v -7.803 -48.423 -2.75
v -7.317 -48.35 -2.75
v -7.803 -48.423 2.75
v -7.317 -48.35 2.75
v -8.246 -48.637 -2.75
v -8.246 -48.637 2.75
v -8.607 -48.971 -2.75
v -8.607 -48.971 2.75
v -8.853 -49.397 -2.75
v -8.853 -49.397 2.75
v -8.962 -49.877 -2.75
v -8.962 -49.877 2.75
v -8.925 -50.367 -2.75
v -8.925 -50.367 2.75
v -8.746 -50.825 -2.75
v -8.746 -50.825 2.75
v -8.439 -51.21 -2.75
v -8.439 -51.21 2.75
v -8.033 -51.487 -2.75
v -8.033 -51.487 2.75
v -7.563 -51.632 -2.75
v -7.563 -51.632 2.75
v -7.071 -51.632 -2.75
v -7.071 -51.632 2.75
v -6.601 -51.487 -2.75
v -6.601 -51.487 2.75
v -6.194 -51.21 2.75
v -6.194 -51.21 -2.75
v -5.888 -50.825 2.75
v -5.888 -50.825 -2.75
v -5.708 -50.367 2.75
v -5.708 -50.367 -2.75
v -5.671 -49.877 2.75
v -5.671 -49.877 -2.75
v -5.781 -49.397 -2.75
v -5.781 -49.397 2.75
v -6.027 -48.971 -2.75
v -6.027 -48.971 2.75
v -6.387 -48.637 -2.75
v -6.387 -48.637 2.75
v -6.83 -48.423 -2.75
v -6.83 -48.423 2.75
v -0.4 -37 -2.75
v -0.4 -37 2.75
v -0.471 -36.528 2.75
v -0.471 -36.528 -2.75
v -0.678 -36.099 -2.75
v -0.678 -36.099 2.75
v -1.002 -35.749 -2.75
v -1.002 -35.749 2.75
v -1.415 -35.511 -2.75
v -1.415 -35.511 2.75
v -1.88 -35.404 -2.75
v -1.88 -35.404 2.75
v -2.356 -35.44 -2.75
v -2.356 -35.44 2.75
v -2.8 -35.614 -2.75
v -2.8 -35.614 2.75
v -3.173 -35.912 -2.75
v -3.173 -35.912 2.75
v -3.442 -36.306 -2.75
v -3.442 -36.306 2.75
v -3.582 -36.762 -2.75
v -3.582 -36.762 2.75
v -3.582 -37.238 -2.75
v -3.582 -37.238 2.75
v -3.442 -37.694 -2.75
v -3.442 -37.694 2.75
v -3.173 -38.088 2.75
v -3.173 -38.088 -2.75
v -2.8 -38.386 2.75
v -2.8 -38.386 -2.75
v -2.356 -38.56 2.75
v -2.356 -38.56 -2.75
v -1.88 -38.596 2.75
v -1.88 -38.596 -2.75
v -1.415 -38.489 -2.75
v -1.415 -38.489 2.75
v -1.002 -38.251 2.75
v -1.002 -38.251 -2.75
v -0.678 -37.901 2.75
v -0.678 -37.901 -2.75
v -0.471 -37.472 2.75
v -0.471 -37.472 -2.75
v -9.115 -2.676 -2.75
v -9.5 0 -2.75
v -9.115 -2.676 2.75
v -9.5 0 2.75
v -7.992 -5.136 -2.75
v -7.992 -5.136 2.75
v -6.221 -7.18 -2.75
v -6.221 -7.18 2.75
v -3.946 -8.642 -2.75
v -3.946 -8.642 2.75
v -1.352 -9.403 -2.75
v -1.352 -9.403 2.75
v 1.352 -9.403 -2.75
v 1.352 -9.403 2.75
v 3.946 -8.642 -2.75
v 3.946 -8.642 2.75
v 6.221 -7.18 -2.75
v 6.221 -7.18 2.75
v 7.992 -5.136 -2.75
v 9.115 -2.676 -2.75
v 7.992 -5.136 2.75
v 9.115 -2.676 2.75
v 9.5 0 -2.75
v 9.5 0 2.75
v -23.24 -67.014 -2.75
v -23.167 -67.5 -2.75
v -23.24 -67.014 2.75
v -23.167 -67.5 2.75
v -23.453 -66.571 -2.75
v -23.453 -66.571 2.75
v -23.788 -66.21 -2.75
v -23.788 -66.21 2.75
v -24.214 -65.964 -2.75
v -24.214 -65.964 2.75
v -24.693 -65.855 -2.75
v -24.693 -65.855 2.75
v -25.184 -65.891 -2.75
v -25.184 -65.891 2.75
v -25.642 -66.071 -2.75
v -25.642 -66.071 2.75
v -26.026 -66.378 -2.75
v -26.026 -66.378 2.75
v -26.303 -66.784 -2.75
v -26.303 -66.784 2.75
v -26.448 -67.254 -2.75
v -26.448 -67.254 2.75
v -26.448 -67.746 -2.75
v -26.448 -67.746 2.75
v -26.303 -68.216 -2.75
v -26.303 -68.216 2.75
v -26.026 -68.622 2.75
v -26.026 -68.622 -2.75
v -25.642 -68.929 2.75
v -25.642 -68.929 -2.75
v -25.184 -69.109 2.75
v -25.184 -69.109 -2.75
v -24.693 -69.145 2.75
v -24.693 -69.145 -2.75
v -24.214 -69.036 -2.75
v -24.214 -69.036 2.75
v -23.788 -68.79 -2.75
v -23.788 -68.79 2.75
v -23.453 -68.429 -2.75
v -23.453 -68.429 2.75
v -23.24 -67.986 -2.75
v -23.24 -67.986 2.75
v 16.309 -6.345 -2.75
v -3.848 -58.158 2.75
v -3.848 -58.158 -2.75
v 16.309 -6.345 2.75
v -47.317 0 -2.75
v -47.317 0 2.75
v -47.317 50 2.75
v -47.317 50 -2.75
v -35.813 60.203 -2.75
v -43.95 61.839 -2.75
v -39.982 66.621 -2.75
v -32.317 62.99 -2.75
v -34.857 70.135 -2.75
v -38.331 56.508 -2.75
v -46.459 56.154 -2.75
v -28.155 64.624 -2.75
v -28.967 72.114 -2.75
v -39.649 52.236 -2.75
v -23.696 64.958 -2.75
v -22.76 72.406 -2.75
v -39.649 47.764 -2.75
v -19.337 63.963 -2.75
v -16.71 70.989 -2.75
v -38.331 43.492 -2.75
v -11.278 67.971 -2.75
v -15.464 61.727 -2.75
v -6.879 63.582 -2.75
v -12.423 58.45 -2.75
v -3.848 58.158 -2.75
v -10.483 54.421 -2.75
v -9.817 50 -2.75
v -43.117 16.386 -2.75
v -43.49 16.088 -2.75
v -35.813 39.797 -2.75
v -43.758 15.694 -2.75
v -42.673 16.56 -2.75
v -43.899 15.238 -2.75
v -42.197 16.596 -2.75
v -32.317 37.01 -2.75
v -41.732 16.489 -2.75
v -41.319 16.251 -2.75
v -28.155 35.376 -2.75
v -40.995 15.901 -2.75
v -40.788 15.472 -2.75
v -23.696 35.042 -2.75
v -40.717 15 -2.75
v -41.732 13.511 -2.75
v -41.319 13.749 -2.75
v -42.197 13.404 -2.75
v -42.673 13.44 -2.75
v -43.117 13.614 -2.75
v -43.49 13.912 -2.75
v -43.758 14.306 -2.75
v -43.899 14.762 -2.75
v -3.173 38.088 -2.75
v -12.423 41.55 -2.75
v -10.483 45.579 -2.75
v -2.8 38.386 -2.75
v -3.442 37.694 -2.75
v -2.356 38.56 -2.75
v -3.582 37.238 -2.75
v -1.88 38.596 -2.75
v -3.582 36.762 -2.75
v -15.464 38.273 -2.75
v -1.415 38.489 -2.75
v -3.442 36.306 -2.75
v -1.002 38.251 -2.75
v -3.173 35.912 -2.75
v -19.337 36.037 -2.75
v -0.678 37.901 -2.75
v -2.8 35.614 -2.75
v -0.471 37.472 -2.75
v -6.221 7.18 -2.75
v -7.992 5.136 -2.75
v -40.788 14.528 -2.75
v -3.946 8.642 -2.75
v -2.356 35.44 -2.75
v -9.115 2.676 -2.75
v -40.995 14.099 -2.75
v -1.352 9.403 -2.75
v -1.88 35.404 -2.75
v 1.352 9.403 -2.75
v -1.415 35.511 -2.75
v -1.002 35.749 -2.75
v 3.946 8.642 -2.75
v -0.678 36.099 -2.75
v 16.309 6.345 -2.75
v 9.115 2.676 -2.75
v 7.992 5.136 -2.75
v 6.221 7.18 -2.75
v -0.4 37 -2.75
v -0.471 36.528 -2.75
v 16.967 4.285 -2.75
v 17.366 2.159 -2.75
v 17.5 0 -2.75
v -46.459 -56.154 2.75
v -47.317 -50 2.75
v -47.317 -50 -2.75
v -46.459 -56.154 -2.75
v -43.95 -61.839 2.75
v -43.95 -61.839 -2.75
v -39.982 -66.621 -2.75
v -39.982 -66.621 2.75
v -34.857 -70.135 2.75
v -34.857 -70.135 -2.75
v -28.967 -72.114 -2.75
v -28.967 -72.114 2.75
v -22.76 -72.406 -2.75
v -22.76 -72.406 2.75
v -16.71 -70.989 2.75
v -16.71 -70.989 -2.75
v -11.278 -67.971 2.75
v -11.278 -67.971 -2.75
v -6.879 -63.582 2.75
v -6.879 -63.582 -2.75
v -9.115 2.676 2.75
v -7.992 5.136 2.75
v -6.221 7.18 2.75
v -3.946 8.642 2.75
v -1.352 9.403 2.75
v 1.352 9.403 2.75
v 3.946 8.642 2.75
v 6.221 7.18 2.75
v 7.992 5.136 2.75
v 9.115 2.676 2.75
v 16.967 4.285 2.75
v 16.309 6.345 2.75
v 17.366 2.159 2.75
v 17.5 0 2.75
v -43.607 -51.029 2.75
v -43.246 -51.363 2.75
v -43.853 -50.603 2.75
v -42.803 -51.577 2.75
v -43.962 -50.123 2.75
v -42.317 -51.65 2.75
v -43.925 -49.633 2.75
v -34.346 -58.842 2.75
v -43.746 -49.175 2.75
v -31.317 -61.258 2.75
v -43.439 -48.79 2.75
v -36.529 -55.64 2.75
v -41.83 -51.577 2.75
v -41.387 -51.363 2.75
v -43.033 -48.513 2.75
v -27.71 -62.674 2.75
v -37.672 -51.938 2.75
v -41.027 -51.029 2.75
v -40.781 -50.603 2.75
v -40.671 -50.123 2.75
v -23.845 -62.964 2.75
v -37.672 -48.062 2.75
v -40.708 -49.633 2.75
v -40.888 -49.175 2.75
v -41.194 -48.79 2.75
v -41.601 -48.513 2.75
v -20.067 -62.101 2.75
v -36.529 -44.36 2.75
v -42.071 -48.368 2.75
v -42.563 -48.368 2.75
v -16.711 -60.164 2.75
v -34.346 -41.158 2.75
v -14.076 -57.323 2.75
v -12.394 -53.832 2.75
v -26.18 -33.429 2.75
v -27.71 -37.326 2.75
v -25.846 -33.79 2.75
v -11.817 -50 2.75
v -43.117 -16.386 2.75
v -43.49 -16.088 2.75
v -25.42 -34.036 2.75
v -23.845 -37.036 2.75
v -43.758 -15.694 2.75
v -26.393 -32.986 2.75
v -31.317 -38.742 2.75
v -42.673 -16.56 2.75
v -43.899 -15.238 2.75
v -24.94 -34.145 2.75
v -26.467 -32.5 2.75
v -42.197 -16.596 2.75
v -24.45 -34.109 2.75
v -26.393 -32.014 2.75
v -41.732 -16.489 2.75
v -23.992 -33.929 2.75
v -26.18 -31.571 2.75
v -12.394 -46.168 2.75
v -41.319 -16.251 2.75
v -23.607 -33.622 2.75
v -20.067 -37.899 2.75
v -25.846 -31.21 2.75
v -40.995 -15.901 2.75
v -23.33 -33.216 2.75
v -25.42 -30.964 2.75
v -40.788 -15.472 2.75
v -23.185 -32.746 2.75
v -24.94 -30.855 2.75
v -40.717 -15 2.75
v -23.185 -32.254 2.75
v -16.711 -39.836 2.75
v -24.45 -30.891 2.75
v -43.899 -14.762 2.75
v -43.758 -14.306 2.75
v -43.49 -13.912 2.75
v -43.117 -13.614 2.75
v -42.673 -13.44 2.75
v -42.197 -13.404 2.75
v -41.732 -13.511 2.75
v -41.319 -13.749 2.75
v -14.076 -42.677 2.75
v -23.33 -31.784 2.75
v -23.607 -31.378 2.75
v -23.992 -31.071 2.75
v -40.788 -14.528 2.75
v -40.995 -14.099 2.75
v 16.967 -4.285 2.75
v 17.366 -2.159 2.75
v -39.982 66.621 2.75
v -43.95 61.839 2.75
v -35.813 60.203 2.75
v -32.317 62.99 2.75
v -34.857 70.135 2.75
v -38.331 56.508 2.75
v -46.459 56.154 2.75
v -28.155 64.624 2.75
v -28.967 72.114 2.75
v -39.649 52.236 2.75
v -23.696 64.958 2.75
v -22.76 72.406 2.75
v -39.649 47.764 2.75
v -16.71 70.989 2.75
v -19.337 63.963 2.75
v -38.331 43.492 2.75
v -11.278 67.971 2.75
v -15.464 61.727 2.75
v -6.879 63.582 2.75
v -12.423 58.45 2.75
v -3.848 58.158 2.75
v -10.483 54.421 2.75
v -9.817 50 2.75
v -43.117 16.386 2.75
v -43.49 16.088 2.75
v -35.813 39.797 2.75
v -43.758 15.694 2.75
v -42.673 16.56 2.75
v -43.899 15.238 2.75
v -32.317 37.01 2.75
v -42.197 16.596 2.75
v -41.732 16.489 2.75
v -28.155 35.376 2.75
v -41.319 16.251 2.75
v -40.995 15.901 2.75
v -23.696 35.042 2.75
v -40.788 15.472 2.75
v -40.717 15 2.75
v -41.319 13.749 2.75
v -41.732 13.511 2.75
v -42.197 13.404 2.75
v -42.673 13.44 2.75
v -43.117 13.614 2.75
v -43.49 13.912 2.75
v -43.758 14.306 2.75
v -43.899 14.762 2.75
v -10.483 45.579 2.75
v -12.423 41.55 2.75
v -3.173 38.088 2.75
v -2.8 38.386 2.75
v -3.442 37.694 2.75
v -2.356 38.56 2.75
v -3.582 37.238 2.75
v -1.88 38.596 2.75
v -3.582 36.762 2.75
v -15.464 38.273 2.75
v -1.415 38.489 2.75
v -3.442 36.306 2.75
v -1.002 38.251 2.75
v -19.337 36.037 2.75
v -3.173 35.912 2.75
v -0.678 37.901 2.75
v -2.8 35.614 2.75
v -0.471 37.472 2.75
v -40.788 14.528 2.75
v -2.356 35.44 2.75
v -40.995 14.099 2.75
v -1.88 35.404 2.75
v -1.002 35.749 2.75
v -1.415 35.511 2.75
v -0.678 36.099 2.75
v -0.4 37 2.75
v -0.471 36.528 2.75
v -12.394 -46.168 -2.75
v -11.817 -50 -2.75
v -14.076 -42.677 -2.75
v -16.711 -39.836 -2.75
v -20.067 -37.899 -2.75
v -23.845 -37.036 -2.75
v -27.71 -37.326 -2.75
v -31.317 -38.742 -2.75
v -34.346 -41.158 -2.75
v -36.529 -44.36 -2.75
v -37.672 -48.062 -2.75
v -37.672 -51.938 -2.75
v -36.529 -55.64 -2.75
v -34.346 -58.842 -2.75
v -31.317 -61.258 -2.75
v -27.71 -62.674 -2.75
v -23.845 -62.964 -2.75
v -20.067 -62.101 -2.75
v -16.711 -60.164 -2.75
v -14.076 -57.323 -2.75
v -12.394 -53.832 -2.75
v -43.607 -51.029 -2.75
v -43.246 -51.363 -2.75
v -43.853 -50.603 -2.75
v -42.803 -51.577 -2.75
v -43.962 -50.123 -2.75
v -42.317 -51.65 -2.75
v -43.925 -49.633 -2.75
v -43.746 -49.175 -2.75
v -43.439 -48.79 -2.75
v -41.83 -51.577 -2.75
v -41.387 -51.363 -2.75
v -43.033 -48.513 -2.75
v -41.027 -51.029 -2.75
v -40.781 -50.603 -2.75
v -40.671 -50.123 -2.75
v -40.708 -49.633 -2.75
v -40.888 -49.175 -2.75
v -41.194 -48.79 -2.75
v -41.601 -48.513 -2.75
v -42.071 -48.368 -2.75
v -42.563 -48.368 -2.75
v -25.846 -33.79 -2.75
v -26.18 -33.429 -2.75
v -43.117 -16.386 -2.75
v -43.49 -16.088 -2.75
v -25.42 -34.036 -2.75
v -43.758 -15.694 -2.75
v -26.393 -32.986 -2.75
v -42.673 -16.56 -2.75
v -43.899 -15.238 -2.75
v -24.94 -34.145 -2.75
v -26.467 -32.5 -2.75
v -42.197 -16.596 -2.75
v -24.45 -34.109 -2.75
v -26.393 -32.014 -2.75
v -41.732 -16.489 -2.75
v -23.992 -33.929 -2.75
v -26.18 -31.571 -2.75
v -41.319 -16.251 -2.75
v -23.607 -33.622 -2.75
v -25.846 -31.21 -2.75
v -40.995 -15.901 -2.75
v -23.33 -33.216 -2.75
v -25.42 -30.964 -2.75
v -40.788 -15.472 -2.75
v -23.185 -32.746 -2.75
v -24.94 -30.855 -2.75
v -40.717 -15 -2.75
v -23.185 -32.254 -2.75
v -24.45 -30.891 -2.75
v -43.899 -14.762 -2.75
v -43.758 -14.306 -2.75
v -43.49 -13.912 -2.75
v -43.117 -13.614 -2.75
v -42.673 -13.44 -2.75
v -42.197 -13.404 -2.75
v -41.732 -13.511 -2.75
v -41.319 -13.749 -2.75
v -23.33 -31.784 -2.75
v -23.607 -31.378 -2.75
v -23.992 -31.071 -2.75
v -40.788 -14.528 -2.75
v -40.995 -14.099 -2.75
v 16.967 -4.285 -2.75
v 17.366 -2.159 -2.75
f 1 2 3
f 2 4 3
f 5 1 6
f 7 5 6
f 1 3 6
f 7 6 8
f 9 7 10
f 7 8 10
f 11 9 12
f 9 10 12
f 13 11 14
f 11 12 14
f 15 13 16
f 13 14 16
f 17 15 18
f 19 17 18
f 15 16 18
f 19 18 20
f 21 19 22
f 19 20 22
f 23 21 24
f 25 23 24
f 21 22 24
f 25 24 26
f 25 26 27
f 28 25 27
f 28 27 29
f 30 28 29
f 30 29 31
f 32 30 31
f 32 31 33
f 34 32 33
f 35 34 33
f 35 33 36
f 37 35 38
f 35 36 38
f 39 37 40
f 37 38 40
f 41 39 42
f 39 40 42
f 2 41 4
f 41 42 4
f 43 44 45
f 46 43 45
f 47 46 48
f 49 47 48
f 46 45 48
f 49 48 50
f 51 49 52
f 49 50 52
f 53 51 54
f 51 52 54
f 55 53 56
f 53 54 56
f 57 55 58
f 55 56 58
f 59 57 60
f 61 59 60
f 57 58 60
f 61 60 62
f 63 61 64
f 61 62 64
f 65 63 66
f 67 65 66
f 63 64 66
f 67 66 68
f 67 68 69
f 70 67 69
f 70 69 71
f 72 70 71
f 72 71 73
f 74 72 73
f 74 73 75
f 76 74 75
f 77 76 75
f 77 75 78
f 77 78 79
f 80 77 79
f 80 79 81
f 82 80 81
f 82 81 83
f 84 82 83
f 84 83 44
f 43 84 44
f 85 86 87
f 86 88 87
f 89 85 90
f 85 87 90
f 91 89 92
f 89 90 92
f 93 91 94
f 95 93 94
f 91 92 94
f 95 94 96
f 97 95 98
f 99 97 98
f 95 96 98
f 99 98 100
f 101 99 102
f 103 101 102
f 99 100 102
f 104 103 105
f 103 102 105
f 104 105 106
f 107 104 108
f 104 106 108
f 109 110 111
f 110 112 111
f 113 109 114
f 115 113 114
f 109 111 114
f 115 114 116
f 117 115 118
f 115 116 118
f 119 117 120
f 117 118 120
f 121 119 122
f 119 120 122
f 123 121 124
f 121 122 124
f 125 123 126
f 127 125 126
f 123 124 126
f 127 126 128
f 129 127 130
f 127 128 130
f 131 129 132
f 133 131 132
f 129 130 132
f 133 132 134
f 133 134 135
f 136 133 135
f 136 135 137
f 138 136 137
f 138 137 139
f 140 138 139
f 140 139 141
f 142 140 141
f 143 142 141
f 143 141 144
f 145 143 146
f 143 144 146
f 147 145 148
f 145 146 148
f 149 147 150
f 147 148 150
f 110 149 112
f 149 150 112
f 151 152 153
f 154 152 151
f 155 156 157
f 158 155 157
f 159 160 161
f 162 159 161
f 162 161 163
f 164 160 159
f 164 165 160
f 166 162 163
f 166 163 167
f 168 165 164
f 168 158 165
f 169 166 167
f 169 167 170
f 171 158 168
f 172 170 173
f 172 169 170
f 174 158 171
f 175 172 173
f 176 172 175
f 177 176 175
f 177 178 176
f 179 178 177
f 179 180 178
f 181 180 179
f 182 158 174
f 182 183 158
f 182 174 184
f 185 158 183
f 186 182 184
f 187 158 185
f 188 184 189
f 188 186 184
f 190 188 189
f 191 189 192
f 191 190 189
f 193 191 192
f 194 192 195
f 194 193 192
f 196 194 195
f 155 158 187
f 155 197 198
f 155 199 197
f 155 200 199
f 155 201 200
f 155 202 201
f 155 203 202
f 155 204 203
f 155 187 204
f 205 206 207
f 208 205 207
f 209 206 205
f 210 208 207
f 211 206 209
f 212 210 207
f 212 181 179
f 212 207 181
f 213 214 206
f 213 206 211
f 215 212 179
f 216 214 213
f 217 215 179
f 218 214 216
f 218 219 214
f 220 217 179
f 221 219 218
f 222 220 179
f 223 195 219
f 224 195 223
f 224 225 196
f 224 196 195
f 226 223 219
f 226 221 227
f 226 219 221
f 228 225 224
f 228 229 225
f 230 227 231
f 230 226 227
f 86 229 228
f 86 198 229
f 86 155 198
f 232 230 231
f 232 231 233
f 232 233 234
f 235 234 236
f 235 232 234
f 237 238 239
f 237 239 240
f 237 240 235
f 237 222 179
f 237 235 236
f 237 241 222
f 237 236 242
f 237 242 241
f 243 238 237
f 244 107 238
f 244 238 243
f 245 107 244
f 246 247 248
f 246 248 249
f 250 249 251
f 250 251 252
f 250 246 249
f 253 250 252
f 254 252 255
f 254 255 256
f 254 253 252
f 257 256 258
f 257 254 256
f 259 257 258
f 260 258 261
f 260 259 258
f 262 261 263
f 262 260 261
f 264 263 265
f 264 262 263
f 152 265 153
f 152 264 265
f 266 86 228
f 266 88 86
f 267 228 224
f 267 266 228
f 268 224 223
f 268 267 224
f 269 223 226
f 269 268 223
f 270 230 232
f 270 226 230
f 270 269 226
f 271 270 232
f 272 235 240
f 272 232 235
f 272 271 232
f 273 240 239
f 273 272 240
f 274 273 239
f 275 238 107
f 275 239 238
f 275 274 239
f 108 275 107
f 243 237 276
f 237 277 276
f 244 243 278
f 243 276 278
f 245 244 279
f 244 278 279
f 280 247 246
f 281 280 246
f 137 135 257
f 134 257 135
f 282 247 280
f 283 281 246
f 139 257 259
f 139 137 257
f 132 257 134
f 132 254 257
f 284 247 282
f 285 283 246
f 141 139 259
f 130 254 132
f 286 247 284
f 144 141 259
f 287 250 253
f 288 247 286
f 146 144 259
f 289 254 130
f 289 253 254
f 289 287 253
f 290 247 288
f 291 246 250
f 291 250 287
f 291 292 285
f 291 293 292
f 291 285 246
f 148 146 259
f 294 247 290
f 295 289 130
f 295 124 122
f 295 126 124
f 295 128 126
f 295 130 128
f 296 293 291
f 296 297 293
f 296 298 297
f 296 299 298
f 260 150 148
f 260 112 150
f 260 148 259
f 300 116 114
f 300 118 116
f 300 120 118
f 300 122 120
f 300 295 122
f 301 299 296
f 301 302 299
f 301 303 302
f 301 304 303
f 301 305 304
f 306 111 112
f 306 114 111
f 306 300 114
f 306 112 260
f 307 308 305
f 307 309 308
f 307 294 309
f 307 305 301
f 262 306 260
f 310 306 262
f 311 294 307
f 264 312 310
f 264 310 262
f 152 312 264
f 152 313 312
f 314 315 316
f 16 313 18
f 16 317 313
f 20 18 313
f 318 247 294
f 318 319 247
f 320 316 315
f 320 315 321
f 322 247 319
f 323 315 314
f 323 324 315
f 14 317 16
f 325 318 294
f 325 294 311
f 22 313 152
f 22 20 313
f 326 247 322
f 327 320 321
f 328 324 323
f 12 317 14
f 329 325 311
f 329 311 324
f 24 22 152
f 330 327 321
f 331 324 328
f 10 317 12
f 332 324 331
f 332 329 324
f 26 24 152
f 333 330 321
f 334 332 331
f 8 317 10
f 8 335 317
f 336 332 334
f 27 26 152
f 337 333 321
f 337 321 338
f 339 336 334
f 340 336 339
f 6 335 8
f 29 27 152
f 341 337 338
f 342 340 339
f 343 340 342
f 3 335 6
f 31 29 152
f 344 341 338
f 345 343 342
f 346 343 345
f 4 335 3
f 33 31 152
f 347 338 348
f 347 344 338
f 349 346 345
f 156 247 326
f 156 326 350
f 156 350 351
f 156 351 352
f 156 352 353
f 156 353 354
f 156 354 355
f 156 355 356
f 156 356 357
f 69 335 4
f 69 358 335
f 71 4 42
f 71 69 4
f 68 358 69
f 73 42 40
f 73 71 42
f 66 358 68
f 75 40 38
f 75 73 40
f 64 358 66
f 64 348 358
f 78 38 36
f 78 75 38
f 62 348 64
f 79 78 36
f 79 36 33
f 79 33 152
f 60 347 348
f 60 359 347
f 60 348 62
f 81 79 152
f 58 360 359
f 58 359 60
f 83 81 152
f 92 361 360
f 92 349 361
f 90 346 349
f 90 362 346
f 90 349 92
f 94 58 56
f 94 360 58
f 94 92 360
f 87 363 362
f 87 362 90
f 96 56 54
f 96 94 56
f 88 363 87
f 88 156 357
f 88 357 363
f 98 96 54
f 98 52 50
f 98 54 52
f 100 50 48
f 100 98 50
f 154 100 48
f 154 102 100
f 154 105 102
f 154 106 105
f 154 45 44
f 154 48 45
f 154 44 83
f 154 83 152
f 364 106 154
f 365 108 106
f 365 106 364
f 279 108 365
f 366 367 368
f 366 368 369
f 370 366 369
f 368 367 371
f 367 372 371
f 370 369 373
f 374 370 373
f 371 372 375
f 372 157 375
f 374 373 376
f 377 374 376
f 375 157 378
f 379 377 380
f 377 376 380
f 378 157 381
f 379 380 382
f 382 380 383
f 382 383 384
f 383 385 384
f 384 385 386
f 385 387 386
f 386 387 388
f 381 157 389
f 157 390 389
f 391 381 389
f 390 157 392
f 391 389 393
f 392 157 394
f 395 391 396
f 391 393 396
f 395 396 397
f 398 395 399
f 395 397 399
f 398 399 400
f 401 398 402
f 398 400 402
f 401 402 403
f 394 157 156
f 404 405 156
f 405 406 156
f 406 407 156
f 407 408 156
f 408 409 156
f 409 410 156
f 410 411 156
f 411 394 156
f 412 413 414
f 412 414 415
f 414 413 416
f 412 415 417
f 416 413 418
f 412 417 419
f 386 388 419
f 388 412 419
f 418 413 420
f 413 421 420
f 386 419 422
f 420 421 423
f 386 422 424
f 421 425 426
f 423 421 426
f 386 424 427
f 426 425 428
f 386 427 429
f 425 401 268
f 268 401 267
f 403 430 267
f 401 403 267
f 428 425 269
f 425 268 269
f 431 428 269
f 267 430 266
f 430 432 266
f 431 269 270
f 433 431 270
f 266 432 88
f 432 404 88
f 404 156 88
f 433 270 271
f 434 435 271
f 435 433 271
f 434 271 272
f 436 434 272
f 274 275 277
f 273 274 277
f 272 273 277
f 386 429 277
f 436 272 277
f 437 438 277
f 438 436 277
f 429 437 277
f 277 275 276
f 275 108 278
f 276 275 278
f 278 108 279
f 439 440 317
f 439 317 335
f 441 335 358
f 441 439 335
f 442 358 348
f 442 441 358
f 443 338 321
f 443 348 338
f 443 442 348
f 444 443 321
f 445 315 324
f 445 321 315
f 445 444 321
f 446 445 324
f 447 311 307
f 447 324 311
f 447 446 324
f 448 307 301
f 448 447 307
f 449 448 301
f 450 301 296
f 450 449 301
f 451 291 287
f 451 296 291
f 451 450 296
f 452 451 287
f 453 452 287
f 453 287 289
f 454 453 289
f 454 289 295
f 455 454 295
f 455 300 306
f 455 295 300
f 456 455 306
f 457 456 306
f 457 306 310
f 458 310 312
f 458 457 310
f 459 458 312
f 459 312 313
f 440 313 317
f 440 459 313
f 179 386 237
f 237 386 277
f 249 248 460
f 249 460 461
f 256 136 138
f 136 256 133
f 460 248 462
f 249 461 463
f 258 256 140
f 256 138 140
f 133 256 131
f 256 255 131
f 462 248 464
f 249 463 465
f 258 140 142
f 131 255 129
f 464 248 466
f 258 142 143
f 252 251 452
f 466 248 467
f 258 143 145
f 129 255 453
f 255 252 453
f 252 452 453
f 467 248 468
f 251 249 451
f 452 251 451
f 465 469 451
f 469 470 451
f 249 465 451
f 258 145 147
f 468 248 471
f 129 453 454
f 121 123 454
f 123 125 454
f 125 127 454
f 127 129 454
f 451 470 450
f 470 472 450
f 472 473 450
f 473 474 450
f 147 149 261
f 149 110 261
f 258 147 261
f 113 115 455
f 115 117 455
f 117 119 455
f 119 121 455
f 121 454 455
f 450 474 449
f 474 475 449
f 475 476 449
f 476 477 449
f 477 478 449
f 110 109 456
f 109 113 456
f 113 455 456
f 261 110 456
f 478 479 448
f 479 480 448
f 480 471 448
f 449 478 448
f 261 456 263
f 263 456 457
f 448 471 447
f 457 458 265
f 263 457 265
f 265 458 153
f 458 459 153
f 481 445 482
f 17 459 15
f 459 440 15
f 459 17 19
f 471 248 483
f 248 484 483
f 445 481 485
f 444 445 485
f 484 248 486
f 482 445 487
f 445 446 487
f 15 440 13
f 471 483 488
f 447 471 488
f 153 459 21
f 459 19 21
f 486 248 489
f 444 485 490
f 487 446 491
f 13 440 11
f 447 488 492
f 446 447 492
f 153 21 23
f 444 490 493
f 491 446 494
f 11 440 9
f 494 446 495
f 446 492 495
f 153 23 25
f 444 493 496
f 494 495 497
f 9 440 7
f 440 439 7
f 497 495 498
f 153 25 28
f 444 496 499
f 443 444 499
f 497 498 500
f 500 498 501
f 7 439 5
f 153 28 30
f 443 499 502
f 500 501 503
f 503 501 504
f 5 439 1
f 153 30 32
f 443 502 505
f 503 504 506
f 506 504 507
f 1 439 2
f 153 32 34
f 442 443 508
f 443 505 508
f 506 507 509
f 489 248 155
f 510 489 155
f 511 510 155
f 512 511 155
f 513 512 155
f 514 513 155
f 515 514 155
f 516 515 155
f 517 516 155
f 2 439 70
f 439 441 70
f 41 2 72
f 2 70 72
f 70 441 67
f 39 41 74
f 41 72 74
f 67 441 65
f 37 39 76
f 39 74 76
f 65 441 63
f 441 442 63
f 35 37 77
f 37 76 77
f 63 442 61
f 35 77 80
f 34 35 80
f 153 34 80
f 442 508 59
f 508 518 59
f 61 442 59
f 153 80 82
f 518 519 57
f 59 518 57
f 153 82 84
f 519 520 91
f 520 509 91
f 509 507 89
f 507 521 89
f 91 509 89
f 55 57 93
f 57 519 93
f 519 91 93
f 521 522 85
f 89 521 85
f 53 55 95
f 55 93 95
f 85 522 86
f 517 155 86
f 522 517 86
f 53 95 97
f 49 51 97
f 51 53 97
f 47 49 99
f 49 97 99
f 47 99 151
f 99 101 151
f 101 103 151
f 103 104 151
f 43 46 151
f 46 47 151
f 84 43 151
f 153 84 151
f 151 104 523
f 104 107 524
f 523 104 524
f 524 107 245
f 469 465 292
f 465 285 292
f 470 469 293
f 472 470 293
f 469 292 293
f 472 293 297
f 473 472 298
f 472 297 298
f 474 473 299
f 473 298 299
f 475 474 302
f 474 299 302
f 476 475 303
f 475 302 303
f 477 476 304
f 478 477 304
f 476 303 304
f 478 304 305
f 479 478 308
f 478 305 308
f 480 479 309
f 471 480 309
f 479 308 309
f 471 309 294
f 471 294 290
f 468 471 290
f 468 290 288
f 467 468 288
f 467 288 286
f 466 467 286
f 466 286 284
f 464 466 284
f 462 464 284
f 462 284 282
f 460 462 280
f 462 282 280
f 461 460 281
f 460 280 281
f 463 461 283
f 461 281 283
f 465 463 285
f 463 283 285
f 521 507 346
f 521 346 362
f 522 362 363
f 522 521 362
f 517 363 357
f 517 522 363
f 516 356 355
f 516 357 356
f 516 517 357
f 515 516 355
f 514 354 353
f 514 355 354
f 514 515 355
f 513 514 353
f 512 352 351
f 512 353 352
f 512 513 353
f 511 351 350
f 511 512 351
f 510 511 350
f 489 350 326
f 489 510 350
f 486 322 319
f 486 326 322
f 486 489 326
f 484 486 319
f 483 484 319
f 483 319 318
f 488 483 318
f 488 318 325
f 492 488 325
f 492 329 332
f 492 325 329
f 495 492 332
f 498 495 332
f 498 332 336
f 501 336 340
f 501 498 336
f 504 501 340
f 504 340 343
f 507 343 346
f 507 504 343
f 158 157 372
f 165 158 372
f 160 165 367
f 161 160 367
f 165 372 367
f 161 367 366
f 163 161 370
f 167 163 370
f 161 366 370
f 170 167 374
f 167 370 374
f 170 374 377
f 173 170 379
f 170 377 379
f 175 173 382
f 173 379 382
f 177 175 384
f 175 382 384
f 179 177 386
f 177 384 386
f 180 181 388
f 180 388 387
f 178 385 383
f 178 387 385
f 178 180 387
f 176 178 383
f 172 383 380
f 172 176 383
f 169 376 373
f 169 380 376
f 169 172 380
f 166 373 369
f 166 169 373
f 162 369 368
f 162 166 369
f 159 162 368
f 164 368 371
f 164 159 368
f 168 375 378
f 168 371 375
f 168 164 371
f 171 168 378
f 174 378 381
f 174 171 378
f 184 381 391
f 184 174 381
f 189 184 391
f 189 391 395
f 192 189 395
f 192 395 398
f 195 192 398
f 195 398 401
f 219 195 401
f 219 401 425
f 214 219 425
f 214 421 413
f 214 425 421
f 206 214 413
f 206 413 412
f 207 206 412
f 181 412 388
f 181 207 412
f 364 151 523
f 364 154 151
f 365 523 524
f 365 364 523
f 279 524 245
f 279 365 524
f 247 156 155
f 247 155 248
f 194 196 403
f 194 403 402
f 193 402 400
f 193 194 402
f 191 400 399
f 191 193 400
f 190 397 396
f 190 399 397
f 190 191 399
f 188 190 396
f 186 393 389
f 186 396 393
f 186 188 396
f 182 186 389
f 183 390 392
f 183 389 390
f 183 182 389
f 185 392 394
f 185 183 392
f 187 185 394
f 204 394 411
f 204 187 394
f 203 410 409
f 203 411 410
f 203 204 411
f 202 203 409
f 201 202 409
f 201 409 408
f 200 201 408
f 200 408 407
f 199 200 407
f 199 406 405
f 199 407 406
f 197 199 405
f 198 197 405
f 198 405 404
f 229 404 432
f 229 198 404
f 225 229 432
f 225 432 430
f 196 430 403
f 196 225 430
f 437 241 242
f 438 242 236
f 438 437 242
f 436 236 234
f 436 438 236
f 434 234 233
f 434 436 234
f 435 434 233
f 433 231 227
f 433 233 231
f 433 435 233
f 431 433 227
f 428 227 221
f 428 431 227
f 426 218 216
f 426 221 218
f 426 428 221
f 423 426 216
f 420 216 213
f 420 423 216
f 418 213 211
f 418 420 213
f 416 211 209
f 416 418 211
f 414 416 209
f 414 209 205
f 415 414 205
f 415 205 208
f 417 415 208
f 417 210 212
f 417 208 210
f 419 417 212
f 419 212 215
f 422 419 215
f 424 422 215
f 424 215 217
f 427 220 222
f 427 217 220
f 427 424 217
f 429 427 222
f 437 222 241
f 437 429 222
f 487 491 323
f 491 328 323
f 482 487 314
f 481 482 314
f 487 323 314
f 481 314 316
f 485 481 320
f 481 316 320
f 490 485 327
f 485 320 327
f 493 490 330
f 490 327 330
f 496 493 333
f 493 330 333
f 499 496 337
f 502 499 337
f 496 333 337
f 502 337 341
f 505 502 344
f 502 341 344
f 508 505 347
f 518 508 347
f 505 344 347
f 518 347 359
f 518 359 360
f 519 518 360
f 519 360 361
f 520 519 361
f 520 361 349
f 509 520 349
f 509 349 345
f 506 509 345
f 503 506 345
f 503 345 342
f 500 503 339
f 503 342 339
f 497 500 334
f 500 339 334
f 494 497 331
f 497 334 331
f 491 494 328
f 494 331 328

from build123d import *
from build123d.topology import SkipClean

# Parameters (mm, degrees)
EXTRUDE_1_DEPTH          = 2.75
SKETCH_2_R               = 9.5
CUT_EXTRUDE_1_DEPTH      = 87.748932825
SKETCH_3_R               = 1.65
CUT_EXTRUDE_2_DEPTH      = 87.748932825
CUT_EXTRUDE_3_DEPTH      = 87.748932825
CUT_EXTRUDE_3_DEPTH_BACK = 87.748932825
SKETCH_4_R               = 13
PATTERN_CIRCULAR_1_COUNT = 4
SKETCH_6_R               = 1.6
CUT_EXTRUDE_5_DEPTH      = 87.748932825
CUT_EXTRUDE_4_DEPTH      = 87.748932825
CUT_EXTRUDE_4_DEPTH_BACK = 87.748932825
SKETCH_5_R               = 15
CUT_EXTRUDE_7_DEPTH      = 87.748932825
CUT_EXTRUDE_7_DEPTH_BACK = 87.748932825
SKETCH_8_R               = 1.6


with BuildPart() as part:
    # ｽｹｯﾁ1 → ﾎﾞｽ - 押し出し1 (new, symmetric)
    with BuildSketch(Plane.XY):
        with BuildLine():
            Line((17.5, 0), (-47.316776584, 0))
            Line((-47.316776584, 0), (-47.316776584, -50))
            ThreePointArc((-47.316776584, -50), (-28.966828956, -72.113956347), (-3.847704112, -58.157695734))
            Line((-3.847704112, -58.157695734), (16.309278589, -6.34487446))
            ThreePointArc((16.309278589, -6.34487446), (17.199743825, -3.227818512), (17.5, 0))
        make_face()
    extrude_1 = extrude(amount=EXTRUDE_1_DEPTH, both=True)

    # ｽｹｯﾁ2 → ｶｯﾄ - 押し出し1 (cut, symmetric)
    with BuildSketch(Plane.XY.offset(2.75)):
        Circle(SKETCH_2_R)
    cut_extrude_1 = extrude(amount=CUT_EXTRUDE_1_DEPTH, both=True, mode=Mode.SUBTRACT)

    # ｽｹｯﾁ3 → ｶｯﾄ - 押し出し2 (cut, symmetric)
    with BuildSketch(Plane.XY.offset(2.75)):
        with Locations((-24.816776584, -67.5)):
            Circle(SKETCH_3_R)
    cut_extrude_2 = extrude(amount=CUT_EXTRUDE_2_DEPTH, both=True, mode=Mode.SUBTRACT)

    # ｽｹｯﾁ4 → ｶｯﾄ - 押し出し3 (cut, two sides: drawn at the far end of the back side and taken through both)
    with BuildSketch(Plane.XY.offset(2.75).offset(-CUT_EXTRUDE_3_DEPTH_BACK)):
        with Locations((-24.816776584, -50)):
            Circle(SKETCH_4_R)
    extrude(amount=CUT_EXTRUDE_3_DEPTH + CUT_EXTRUDE_3_DEPTH_BACK, mode=Mode.SUBTRACT)

    # 円形ﾊﾟﾀｰﾝ1: ｶｯﾄ - 押し出し2 ×4 about axis
    pattern_circular_1_axis = Axis((-24.816776584, -50, 0), (0, 0, 1))
    for i in range(1, PATTERN_CIRCULAR_1_COUNT):
        add(cut_extrude_2.rotate(pattern_circular_1_axis, i * 360 / PATTERN_CIRCULAR_1_COUNT), mode=Mode.SUBTRACT)

    # ｽｹｯﾁ6 → ｶｯﾄ - 押し出し5 (cut, through all)
    with BuildSketch(Plane.XY.offset(2.75)):
        with Locations((-2, -37)):
            Circle(SKETCH_6_R)
    cut_extrude_5 = extrude(amount=-CUT_EXTRUDE_5_DEPTH, mode=Mode.SUBTRACT)

    # ﾐﾗｰ1: ﾎﾞｽ - 押し出し1, ｶｯﾄ - 押し出し1, ｶｯﾄ - 押し出し5 across plane
    with SkipClean():  # the faces are left unmerged after this step: merging them gives an invalid solid
        add(extrude_1.mirror(Plane.ZX))
        add(cut_extrude_1.mirror(Plane.ZX), mode=Mode.SUBTRACT)
        add(cut_extrude_5.mirror(Plane.ZX), mode=Mode.SUBTRACT)

    # ｽｹｯﾁ5 → ｶｯﾄ - 押し出し4 (cut, two sides: drawn at the far end of the back side and taken through both)
    with SkipClean():  # the faces are left unmerged after this step: merging them gives an invalid solid
        with BuildSketch(Plane.XY.offset(2.75).offset(-CUT_EXTRUDE_4_DEPTH_BACK)):
            with Locations((-24.816776584, 50)):
                Circle(SKETCH_5_R)
        extrude(amount=CUT_EXTRUDE_4_DEPTH + CUT_EXTRUDE_4_DEPTH_BACK, mode=Mode.SUBTRACT)

    # ｽｹｯﾁ8 → ｶｯﾄ - 押し出し7 (cut, two sides: drawn at the far end of the back side and taken through both)
    with SkipClean():  # the faces are left unmerged after this step: merging them gives an invalid solid
        with BuildSketch(Plane.XY.offset(2.75).offset(-CUT_EXTRUDE_7_DEPTH_BACK)):
            with Locations((-42.316776584, 15)):
                Circle(SKETCH_8_R)
            with Locations((-42.316776584, -15)):
                Circle(SKETCH_8_R)
        extrude(amount=CUT_EXTRUDE_7_DEPTH + CUT_EXTRUDE_7_DEPTH_BACK, mode=Mode.SUBTRACT)


solid = part.part
